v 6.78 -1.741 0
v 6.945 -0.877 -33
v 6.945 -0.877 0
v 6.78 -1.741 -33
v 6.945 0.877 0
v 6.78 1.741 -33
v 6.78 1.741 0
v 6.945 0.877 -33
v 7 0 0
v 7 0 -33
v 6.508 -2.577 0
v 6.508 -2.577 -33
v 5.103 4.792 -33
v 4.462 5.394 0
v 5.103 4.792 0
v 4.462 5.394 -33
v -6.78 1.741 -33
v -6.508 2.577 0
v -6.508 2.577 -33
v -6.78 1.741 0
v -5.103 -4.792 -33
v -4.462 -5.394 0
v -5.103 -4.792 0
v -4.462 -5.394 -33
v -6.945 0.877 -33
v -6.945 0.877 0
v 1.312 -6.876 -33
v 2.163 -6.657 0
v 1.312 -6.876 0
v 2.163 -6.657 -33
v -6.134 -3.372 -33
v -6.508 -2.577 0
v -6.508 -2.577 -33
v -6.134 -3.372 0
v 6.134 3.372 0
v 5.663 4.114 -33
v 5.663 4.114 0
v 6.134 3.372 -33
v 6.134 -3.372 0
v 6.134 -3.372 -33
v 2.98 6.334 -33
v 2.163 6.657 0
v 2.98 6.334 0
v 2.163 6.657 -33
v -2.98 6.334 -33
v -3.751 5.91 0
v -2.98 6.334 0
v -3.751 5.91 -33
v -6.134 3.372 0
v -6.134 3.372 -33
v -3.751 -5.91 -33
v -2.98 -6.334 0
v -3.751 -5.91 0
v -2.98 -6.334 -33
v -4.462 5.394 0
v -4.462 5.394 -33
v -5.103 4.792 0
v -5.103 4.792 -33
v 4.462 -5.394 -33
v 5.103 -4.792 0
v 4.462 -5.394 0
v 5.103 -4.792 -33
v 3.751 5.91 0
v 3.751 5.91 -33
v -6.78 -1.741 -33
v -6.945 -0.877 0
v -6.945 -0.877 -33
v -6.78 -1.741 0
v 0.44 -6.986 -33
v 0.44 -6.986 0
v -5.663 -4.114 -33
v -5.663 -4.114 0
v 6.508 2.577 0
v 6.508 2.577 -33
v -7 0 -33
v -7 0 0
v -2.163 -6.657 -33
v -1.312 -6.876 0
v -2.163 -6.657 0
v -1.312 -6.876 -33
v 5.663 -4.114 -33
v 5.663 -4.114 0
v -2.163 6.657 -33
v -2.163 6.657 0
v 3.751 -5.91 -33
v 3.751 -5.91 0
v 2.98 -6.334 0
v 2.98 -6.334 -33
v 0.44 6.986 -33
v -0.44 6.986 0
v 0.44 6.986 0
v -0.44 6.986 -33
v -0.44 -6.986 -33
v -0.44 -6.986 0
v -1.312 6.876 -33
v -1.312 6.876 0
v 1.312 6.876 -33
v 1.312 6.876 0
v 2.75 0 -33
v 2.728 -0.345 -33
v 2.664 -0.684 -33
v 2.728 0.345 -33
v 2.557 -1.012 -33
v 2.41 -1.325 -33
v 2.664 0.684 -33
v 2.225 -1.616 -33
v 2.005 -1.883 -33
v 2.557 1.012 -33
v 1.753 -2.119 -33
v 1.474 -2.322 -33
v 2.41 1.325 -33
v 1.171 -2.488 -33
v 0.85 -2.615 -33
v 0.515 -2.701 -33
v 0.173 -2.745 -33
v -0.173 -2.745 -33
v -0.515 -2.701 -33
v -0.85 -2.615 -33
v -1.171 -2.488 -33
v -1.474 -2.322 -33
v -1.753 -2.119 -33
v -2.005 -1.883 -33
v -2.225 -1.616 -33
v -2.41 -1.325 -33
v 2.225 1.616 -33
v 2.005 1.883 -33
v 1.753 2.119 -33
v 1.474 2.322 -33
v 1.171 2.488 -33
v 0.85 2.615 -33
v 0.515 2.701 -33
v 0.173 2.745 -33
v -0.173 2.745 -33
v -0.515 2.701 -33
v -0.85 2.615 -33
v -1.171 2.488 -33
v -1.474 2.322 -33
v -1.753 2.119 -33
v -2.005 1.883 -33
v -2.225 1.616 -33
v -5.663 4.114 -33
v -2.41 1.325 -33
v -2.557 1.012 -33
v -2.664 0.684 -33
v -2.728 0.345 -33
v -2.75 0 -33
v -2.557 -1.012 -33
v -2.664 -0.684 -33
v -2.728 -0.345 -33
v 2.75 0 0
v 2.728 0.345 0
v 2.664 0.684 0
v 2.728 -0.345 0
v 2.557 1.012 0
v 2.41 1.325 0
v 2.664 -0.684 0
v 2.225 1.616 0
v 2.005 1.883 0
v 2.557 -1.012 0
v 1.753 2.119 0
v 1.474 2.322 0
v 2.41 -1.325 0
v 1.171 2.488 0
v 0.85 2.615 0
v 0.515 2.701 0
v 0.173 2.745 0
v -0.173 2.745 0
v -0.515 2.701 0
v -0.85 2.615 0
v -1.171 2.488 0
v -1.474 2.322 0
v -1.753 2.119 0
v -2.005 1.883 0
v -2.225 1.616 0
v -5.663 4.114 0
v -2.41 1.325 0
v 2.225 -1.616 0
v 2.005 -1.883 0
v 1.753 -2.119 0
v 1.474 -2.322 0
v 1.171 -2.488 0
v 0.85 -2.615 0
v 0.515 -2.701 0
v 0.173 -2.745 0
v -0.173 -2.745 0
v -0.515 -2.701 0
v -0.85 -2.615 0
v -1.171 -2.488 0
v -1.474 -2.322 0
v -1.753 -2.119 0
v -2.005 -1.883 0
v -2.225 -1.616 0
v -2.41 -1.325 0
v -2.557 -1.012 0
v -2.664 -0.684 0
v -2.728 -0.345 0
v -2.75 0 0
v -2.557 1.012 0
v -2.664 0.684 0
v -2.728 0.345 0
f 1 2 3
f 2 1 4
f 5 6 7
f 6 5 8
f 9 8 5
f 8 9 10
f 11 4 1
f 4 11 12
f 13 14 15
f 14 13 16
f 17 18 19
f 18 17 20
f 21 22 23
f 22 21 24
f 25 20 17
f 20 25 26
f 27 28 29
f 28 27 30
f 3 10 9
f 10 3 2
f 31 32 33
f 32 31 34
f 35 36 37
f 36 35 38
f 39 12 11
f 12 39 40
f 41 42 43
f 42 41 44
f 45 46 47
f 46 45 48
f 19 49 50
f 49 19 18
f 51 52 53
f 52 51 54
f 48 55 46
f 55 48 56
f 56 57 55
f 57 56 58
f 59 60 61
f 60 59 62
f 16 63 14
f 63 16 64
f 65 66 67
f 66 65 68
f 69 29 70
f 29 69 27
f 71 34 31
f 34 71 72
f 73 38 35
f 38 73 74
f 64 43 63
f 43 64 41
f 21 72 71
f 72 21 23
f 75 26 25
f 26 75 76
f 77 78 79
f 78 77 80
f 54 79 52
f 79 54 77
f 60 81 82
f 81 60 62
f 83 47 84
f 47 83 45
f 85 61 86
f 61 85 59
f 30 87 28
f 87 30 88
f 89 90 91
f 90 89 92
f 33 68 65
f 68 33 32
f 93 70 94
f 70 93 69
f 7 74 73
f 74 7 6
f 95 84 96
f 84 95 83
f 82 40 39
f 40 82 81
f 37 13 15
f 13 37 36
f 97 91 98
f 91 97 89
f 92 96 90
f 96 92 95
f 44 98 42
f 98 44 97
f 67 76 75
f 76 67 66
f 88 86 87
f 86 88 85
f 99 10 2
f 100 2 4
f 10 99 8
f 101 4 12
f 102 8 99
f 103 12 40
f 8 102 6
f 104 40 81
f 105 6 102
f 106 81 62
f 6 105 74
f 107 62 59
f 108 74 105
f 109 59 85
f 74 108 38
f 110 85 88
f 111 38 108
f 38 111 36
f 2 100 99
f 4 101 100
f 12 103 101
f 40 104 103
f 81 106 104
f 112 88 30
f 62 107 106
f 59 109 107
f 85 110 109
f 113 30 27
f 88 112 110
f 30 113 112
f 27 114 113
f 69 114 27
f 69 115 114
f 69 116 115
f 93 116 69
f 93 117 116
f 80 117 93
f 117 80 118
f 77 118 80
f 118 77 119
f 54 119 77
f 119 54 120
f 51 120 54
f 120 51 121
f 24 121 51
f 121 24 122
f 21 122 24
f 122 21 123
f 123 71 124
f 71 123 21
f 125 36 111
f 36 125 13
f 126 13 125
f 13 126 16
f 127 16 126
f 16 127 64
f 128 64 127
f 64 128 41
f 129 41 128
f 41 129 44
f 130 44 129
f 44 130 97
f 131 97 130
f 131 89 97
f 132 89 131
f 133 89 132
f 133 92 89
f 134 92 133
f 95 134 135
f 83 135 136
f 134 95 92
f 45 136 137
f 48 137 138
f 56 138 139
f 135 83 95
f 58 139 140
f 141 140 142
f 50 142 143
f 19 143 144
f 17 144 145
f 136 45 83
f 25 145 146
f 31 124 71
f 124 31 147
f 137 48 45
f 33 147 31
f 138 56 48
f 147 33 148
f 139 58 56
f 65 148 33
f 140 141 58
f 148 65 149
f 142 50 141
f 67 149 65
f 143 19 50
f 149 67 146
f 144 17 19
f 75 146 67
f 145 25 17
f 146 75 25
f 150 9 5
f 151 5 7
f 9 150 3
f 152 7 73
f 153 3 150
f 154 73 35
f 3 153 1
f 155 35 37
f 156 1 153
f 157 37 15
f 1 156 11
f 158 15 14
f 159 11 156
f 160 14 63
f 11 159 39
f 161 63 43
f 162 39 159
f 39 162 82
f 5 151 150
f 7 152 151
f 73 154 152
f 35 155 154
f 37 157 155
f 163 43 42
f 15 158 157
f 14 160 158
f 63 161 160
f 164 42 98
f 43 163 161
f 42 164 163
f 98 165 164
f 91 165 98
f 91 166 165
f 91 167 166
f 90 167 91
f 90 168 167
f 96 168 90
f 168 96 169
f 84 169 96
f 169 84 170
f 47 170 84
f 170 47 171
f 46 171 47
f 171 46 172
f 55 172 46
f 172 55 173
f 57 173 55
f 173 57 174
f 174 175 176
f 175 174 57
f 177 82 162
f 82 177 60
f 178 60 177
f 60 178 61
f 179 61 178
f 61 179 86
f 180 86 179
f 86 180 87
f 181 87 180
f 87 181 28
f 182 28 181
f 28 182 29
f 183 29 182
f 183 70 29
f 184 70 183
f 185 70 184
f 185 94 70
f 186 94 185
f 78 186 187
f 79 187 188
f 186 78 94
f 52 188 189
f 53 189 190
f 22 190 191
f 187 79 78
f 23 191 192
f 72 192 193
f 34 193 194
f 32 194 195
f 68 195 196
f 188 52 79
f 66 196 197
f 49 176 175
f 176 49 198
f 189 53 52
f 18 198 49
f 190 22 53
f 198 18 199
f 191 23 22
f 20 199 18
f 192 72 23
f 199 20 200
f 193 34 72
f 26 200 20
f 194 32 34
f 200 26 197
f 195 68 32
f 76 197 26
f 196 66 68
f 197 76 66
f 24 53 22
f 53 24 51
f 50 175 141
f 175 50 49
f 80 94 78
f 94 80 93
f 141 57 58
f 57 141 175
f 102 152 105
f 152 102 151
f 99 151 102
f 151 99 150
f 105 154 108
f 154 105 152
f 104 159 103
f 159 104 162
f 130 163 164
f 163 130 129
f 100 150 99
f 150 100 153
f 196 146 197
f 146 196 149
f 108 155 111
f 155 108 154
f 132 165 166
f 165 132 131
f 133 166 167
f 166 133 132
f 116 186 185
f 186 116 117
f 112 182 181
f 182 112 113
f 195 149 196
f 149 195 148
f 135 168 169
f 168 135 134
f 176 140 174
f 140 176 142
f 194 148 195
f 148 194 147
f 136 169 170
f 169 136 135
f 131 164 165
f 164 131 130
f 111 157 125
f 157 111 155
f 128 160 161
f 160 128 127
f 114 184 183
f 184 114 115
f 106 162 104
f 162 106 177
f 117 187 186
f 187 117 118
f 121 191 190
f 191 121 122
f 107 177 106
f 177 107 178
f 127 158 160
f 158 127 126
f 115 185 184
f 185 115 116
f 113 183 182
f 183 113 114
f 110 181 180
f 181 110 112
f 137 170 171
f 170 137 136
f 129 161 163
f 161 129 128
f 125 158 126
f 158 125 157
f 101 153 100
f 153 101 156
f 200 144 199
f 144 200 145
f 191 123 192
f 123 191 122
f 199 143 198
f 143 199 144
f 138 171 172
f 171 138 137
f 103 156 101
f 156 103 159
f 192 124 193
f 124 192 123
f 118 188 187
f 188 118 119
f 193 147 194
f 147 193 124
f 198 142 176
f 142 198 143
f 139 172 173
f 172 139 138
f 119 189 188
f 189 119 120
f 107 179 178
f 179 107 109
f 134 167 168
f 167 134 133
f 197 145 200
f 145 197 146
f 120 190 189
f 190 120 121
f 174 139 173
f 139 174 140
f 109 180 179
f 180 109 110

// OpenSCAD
$fn = 50;


difference() {
	union() {
		translate(v = [0, 0, -33.0000000000]) {
			cylinder(h = 33, r = 7.0000000000);
		}
		cylinder(h = 0, r = 17.0000000000);
	}
	union() {
		#translate(v = [0, 0, -33]) {
			cylinder(h = 33, r = 2.7500000000);
		}
	}
}
